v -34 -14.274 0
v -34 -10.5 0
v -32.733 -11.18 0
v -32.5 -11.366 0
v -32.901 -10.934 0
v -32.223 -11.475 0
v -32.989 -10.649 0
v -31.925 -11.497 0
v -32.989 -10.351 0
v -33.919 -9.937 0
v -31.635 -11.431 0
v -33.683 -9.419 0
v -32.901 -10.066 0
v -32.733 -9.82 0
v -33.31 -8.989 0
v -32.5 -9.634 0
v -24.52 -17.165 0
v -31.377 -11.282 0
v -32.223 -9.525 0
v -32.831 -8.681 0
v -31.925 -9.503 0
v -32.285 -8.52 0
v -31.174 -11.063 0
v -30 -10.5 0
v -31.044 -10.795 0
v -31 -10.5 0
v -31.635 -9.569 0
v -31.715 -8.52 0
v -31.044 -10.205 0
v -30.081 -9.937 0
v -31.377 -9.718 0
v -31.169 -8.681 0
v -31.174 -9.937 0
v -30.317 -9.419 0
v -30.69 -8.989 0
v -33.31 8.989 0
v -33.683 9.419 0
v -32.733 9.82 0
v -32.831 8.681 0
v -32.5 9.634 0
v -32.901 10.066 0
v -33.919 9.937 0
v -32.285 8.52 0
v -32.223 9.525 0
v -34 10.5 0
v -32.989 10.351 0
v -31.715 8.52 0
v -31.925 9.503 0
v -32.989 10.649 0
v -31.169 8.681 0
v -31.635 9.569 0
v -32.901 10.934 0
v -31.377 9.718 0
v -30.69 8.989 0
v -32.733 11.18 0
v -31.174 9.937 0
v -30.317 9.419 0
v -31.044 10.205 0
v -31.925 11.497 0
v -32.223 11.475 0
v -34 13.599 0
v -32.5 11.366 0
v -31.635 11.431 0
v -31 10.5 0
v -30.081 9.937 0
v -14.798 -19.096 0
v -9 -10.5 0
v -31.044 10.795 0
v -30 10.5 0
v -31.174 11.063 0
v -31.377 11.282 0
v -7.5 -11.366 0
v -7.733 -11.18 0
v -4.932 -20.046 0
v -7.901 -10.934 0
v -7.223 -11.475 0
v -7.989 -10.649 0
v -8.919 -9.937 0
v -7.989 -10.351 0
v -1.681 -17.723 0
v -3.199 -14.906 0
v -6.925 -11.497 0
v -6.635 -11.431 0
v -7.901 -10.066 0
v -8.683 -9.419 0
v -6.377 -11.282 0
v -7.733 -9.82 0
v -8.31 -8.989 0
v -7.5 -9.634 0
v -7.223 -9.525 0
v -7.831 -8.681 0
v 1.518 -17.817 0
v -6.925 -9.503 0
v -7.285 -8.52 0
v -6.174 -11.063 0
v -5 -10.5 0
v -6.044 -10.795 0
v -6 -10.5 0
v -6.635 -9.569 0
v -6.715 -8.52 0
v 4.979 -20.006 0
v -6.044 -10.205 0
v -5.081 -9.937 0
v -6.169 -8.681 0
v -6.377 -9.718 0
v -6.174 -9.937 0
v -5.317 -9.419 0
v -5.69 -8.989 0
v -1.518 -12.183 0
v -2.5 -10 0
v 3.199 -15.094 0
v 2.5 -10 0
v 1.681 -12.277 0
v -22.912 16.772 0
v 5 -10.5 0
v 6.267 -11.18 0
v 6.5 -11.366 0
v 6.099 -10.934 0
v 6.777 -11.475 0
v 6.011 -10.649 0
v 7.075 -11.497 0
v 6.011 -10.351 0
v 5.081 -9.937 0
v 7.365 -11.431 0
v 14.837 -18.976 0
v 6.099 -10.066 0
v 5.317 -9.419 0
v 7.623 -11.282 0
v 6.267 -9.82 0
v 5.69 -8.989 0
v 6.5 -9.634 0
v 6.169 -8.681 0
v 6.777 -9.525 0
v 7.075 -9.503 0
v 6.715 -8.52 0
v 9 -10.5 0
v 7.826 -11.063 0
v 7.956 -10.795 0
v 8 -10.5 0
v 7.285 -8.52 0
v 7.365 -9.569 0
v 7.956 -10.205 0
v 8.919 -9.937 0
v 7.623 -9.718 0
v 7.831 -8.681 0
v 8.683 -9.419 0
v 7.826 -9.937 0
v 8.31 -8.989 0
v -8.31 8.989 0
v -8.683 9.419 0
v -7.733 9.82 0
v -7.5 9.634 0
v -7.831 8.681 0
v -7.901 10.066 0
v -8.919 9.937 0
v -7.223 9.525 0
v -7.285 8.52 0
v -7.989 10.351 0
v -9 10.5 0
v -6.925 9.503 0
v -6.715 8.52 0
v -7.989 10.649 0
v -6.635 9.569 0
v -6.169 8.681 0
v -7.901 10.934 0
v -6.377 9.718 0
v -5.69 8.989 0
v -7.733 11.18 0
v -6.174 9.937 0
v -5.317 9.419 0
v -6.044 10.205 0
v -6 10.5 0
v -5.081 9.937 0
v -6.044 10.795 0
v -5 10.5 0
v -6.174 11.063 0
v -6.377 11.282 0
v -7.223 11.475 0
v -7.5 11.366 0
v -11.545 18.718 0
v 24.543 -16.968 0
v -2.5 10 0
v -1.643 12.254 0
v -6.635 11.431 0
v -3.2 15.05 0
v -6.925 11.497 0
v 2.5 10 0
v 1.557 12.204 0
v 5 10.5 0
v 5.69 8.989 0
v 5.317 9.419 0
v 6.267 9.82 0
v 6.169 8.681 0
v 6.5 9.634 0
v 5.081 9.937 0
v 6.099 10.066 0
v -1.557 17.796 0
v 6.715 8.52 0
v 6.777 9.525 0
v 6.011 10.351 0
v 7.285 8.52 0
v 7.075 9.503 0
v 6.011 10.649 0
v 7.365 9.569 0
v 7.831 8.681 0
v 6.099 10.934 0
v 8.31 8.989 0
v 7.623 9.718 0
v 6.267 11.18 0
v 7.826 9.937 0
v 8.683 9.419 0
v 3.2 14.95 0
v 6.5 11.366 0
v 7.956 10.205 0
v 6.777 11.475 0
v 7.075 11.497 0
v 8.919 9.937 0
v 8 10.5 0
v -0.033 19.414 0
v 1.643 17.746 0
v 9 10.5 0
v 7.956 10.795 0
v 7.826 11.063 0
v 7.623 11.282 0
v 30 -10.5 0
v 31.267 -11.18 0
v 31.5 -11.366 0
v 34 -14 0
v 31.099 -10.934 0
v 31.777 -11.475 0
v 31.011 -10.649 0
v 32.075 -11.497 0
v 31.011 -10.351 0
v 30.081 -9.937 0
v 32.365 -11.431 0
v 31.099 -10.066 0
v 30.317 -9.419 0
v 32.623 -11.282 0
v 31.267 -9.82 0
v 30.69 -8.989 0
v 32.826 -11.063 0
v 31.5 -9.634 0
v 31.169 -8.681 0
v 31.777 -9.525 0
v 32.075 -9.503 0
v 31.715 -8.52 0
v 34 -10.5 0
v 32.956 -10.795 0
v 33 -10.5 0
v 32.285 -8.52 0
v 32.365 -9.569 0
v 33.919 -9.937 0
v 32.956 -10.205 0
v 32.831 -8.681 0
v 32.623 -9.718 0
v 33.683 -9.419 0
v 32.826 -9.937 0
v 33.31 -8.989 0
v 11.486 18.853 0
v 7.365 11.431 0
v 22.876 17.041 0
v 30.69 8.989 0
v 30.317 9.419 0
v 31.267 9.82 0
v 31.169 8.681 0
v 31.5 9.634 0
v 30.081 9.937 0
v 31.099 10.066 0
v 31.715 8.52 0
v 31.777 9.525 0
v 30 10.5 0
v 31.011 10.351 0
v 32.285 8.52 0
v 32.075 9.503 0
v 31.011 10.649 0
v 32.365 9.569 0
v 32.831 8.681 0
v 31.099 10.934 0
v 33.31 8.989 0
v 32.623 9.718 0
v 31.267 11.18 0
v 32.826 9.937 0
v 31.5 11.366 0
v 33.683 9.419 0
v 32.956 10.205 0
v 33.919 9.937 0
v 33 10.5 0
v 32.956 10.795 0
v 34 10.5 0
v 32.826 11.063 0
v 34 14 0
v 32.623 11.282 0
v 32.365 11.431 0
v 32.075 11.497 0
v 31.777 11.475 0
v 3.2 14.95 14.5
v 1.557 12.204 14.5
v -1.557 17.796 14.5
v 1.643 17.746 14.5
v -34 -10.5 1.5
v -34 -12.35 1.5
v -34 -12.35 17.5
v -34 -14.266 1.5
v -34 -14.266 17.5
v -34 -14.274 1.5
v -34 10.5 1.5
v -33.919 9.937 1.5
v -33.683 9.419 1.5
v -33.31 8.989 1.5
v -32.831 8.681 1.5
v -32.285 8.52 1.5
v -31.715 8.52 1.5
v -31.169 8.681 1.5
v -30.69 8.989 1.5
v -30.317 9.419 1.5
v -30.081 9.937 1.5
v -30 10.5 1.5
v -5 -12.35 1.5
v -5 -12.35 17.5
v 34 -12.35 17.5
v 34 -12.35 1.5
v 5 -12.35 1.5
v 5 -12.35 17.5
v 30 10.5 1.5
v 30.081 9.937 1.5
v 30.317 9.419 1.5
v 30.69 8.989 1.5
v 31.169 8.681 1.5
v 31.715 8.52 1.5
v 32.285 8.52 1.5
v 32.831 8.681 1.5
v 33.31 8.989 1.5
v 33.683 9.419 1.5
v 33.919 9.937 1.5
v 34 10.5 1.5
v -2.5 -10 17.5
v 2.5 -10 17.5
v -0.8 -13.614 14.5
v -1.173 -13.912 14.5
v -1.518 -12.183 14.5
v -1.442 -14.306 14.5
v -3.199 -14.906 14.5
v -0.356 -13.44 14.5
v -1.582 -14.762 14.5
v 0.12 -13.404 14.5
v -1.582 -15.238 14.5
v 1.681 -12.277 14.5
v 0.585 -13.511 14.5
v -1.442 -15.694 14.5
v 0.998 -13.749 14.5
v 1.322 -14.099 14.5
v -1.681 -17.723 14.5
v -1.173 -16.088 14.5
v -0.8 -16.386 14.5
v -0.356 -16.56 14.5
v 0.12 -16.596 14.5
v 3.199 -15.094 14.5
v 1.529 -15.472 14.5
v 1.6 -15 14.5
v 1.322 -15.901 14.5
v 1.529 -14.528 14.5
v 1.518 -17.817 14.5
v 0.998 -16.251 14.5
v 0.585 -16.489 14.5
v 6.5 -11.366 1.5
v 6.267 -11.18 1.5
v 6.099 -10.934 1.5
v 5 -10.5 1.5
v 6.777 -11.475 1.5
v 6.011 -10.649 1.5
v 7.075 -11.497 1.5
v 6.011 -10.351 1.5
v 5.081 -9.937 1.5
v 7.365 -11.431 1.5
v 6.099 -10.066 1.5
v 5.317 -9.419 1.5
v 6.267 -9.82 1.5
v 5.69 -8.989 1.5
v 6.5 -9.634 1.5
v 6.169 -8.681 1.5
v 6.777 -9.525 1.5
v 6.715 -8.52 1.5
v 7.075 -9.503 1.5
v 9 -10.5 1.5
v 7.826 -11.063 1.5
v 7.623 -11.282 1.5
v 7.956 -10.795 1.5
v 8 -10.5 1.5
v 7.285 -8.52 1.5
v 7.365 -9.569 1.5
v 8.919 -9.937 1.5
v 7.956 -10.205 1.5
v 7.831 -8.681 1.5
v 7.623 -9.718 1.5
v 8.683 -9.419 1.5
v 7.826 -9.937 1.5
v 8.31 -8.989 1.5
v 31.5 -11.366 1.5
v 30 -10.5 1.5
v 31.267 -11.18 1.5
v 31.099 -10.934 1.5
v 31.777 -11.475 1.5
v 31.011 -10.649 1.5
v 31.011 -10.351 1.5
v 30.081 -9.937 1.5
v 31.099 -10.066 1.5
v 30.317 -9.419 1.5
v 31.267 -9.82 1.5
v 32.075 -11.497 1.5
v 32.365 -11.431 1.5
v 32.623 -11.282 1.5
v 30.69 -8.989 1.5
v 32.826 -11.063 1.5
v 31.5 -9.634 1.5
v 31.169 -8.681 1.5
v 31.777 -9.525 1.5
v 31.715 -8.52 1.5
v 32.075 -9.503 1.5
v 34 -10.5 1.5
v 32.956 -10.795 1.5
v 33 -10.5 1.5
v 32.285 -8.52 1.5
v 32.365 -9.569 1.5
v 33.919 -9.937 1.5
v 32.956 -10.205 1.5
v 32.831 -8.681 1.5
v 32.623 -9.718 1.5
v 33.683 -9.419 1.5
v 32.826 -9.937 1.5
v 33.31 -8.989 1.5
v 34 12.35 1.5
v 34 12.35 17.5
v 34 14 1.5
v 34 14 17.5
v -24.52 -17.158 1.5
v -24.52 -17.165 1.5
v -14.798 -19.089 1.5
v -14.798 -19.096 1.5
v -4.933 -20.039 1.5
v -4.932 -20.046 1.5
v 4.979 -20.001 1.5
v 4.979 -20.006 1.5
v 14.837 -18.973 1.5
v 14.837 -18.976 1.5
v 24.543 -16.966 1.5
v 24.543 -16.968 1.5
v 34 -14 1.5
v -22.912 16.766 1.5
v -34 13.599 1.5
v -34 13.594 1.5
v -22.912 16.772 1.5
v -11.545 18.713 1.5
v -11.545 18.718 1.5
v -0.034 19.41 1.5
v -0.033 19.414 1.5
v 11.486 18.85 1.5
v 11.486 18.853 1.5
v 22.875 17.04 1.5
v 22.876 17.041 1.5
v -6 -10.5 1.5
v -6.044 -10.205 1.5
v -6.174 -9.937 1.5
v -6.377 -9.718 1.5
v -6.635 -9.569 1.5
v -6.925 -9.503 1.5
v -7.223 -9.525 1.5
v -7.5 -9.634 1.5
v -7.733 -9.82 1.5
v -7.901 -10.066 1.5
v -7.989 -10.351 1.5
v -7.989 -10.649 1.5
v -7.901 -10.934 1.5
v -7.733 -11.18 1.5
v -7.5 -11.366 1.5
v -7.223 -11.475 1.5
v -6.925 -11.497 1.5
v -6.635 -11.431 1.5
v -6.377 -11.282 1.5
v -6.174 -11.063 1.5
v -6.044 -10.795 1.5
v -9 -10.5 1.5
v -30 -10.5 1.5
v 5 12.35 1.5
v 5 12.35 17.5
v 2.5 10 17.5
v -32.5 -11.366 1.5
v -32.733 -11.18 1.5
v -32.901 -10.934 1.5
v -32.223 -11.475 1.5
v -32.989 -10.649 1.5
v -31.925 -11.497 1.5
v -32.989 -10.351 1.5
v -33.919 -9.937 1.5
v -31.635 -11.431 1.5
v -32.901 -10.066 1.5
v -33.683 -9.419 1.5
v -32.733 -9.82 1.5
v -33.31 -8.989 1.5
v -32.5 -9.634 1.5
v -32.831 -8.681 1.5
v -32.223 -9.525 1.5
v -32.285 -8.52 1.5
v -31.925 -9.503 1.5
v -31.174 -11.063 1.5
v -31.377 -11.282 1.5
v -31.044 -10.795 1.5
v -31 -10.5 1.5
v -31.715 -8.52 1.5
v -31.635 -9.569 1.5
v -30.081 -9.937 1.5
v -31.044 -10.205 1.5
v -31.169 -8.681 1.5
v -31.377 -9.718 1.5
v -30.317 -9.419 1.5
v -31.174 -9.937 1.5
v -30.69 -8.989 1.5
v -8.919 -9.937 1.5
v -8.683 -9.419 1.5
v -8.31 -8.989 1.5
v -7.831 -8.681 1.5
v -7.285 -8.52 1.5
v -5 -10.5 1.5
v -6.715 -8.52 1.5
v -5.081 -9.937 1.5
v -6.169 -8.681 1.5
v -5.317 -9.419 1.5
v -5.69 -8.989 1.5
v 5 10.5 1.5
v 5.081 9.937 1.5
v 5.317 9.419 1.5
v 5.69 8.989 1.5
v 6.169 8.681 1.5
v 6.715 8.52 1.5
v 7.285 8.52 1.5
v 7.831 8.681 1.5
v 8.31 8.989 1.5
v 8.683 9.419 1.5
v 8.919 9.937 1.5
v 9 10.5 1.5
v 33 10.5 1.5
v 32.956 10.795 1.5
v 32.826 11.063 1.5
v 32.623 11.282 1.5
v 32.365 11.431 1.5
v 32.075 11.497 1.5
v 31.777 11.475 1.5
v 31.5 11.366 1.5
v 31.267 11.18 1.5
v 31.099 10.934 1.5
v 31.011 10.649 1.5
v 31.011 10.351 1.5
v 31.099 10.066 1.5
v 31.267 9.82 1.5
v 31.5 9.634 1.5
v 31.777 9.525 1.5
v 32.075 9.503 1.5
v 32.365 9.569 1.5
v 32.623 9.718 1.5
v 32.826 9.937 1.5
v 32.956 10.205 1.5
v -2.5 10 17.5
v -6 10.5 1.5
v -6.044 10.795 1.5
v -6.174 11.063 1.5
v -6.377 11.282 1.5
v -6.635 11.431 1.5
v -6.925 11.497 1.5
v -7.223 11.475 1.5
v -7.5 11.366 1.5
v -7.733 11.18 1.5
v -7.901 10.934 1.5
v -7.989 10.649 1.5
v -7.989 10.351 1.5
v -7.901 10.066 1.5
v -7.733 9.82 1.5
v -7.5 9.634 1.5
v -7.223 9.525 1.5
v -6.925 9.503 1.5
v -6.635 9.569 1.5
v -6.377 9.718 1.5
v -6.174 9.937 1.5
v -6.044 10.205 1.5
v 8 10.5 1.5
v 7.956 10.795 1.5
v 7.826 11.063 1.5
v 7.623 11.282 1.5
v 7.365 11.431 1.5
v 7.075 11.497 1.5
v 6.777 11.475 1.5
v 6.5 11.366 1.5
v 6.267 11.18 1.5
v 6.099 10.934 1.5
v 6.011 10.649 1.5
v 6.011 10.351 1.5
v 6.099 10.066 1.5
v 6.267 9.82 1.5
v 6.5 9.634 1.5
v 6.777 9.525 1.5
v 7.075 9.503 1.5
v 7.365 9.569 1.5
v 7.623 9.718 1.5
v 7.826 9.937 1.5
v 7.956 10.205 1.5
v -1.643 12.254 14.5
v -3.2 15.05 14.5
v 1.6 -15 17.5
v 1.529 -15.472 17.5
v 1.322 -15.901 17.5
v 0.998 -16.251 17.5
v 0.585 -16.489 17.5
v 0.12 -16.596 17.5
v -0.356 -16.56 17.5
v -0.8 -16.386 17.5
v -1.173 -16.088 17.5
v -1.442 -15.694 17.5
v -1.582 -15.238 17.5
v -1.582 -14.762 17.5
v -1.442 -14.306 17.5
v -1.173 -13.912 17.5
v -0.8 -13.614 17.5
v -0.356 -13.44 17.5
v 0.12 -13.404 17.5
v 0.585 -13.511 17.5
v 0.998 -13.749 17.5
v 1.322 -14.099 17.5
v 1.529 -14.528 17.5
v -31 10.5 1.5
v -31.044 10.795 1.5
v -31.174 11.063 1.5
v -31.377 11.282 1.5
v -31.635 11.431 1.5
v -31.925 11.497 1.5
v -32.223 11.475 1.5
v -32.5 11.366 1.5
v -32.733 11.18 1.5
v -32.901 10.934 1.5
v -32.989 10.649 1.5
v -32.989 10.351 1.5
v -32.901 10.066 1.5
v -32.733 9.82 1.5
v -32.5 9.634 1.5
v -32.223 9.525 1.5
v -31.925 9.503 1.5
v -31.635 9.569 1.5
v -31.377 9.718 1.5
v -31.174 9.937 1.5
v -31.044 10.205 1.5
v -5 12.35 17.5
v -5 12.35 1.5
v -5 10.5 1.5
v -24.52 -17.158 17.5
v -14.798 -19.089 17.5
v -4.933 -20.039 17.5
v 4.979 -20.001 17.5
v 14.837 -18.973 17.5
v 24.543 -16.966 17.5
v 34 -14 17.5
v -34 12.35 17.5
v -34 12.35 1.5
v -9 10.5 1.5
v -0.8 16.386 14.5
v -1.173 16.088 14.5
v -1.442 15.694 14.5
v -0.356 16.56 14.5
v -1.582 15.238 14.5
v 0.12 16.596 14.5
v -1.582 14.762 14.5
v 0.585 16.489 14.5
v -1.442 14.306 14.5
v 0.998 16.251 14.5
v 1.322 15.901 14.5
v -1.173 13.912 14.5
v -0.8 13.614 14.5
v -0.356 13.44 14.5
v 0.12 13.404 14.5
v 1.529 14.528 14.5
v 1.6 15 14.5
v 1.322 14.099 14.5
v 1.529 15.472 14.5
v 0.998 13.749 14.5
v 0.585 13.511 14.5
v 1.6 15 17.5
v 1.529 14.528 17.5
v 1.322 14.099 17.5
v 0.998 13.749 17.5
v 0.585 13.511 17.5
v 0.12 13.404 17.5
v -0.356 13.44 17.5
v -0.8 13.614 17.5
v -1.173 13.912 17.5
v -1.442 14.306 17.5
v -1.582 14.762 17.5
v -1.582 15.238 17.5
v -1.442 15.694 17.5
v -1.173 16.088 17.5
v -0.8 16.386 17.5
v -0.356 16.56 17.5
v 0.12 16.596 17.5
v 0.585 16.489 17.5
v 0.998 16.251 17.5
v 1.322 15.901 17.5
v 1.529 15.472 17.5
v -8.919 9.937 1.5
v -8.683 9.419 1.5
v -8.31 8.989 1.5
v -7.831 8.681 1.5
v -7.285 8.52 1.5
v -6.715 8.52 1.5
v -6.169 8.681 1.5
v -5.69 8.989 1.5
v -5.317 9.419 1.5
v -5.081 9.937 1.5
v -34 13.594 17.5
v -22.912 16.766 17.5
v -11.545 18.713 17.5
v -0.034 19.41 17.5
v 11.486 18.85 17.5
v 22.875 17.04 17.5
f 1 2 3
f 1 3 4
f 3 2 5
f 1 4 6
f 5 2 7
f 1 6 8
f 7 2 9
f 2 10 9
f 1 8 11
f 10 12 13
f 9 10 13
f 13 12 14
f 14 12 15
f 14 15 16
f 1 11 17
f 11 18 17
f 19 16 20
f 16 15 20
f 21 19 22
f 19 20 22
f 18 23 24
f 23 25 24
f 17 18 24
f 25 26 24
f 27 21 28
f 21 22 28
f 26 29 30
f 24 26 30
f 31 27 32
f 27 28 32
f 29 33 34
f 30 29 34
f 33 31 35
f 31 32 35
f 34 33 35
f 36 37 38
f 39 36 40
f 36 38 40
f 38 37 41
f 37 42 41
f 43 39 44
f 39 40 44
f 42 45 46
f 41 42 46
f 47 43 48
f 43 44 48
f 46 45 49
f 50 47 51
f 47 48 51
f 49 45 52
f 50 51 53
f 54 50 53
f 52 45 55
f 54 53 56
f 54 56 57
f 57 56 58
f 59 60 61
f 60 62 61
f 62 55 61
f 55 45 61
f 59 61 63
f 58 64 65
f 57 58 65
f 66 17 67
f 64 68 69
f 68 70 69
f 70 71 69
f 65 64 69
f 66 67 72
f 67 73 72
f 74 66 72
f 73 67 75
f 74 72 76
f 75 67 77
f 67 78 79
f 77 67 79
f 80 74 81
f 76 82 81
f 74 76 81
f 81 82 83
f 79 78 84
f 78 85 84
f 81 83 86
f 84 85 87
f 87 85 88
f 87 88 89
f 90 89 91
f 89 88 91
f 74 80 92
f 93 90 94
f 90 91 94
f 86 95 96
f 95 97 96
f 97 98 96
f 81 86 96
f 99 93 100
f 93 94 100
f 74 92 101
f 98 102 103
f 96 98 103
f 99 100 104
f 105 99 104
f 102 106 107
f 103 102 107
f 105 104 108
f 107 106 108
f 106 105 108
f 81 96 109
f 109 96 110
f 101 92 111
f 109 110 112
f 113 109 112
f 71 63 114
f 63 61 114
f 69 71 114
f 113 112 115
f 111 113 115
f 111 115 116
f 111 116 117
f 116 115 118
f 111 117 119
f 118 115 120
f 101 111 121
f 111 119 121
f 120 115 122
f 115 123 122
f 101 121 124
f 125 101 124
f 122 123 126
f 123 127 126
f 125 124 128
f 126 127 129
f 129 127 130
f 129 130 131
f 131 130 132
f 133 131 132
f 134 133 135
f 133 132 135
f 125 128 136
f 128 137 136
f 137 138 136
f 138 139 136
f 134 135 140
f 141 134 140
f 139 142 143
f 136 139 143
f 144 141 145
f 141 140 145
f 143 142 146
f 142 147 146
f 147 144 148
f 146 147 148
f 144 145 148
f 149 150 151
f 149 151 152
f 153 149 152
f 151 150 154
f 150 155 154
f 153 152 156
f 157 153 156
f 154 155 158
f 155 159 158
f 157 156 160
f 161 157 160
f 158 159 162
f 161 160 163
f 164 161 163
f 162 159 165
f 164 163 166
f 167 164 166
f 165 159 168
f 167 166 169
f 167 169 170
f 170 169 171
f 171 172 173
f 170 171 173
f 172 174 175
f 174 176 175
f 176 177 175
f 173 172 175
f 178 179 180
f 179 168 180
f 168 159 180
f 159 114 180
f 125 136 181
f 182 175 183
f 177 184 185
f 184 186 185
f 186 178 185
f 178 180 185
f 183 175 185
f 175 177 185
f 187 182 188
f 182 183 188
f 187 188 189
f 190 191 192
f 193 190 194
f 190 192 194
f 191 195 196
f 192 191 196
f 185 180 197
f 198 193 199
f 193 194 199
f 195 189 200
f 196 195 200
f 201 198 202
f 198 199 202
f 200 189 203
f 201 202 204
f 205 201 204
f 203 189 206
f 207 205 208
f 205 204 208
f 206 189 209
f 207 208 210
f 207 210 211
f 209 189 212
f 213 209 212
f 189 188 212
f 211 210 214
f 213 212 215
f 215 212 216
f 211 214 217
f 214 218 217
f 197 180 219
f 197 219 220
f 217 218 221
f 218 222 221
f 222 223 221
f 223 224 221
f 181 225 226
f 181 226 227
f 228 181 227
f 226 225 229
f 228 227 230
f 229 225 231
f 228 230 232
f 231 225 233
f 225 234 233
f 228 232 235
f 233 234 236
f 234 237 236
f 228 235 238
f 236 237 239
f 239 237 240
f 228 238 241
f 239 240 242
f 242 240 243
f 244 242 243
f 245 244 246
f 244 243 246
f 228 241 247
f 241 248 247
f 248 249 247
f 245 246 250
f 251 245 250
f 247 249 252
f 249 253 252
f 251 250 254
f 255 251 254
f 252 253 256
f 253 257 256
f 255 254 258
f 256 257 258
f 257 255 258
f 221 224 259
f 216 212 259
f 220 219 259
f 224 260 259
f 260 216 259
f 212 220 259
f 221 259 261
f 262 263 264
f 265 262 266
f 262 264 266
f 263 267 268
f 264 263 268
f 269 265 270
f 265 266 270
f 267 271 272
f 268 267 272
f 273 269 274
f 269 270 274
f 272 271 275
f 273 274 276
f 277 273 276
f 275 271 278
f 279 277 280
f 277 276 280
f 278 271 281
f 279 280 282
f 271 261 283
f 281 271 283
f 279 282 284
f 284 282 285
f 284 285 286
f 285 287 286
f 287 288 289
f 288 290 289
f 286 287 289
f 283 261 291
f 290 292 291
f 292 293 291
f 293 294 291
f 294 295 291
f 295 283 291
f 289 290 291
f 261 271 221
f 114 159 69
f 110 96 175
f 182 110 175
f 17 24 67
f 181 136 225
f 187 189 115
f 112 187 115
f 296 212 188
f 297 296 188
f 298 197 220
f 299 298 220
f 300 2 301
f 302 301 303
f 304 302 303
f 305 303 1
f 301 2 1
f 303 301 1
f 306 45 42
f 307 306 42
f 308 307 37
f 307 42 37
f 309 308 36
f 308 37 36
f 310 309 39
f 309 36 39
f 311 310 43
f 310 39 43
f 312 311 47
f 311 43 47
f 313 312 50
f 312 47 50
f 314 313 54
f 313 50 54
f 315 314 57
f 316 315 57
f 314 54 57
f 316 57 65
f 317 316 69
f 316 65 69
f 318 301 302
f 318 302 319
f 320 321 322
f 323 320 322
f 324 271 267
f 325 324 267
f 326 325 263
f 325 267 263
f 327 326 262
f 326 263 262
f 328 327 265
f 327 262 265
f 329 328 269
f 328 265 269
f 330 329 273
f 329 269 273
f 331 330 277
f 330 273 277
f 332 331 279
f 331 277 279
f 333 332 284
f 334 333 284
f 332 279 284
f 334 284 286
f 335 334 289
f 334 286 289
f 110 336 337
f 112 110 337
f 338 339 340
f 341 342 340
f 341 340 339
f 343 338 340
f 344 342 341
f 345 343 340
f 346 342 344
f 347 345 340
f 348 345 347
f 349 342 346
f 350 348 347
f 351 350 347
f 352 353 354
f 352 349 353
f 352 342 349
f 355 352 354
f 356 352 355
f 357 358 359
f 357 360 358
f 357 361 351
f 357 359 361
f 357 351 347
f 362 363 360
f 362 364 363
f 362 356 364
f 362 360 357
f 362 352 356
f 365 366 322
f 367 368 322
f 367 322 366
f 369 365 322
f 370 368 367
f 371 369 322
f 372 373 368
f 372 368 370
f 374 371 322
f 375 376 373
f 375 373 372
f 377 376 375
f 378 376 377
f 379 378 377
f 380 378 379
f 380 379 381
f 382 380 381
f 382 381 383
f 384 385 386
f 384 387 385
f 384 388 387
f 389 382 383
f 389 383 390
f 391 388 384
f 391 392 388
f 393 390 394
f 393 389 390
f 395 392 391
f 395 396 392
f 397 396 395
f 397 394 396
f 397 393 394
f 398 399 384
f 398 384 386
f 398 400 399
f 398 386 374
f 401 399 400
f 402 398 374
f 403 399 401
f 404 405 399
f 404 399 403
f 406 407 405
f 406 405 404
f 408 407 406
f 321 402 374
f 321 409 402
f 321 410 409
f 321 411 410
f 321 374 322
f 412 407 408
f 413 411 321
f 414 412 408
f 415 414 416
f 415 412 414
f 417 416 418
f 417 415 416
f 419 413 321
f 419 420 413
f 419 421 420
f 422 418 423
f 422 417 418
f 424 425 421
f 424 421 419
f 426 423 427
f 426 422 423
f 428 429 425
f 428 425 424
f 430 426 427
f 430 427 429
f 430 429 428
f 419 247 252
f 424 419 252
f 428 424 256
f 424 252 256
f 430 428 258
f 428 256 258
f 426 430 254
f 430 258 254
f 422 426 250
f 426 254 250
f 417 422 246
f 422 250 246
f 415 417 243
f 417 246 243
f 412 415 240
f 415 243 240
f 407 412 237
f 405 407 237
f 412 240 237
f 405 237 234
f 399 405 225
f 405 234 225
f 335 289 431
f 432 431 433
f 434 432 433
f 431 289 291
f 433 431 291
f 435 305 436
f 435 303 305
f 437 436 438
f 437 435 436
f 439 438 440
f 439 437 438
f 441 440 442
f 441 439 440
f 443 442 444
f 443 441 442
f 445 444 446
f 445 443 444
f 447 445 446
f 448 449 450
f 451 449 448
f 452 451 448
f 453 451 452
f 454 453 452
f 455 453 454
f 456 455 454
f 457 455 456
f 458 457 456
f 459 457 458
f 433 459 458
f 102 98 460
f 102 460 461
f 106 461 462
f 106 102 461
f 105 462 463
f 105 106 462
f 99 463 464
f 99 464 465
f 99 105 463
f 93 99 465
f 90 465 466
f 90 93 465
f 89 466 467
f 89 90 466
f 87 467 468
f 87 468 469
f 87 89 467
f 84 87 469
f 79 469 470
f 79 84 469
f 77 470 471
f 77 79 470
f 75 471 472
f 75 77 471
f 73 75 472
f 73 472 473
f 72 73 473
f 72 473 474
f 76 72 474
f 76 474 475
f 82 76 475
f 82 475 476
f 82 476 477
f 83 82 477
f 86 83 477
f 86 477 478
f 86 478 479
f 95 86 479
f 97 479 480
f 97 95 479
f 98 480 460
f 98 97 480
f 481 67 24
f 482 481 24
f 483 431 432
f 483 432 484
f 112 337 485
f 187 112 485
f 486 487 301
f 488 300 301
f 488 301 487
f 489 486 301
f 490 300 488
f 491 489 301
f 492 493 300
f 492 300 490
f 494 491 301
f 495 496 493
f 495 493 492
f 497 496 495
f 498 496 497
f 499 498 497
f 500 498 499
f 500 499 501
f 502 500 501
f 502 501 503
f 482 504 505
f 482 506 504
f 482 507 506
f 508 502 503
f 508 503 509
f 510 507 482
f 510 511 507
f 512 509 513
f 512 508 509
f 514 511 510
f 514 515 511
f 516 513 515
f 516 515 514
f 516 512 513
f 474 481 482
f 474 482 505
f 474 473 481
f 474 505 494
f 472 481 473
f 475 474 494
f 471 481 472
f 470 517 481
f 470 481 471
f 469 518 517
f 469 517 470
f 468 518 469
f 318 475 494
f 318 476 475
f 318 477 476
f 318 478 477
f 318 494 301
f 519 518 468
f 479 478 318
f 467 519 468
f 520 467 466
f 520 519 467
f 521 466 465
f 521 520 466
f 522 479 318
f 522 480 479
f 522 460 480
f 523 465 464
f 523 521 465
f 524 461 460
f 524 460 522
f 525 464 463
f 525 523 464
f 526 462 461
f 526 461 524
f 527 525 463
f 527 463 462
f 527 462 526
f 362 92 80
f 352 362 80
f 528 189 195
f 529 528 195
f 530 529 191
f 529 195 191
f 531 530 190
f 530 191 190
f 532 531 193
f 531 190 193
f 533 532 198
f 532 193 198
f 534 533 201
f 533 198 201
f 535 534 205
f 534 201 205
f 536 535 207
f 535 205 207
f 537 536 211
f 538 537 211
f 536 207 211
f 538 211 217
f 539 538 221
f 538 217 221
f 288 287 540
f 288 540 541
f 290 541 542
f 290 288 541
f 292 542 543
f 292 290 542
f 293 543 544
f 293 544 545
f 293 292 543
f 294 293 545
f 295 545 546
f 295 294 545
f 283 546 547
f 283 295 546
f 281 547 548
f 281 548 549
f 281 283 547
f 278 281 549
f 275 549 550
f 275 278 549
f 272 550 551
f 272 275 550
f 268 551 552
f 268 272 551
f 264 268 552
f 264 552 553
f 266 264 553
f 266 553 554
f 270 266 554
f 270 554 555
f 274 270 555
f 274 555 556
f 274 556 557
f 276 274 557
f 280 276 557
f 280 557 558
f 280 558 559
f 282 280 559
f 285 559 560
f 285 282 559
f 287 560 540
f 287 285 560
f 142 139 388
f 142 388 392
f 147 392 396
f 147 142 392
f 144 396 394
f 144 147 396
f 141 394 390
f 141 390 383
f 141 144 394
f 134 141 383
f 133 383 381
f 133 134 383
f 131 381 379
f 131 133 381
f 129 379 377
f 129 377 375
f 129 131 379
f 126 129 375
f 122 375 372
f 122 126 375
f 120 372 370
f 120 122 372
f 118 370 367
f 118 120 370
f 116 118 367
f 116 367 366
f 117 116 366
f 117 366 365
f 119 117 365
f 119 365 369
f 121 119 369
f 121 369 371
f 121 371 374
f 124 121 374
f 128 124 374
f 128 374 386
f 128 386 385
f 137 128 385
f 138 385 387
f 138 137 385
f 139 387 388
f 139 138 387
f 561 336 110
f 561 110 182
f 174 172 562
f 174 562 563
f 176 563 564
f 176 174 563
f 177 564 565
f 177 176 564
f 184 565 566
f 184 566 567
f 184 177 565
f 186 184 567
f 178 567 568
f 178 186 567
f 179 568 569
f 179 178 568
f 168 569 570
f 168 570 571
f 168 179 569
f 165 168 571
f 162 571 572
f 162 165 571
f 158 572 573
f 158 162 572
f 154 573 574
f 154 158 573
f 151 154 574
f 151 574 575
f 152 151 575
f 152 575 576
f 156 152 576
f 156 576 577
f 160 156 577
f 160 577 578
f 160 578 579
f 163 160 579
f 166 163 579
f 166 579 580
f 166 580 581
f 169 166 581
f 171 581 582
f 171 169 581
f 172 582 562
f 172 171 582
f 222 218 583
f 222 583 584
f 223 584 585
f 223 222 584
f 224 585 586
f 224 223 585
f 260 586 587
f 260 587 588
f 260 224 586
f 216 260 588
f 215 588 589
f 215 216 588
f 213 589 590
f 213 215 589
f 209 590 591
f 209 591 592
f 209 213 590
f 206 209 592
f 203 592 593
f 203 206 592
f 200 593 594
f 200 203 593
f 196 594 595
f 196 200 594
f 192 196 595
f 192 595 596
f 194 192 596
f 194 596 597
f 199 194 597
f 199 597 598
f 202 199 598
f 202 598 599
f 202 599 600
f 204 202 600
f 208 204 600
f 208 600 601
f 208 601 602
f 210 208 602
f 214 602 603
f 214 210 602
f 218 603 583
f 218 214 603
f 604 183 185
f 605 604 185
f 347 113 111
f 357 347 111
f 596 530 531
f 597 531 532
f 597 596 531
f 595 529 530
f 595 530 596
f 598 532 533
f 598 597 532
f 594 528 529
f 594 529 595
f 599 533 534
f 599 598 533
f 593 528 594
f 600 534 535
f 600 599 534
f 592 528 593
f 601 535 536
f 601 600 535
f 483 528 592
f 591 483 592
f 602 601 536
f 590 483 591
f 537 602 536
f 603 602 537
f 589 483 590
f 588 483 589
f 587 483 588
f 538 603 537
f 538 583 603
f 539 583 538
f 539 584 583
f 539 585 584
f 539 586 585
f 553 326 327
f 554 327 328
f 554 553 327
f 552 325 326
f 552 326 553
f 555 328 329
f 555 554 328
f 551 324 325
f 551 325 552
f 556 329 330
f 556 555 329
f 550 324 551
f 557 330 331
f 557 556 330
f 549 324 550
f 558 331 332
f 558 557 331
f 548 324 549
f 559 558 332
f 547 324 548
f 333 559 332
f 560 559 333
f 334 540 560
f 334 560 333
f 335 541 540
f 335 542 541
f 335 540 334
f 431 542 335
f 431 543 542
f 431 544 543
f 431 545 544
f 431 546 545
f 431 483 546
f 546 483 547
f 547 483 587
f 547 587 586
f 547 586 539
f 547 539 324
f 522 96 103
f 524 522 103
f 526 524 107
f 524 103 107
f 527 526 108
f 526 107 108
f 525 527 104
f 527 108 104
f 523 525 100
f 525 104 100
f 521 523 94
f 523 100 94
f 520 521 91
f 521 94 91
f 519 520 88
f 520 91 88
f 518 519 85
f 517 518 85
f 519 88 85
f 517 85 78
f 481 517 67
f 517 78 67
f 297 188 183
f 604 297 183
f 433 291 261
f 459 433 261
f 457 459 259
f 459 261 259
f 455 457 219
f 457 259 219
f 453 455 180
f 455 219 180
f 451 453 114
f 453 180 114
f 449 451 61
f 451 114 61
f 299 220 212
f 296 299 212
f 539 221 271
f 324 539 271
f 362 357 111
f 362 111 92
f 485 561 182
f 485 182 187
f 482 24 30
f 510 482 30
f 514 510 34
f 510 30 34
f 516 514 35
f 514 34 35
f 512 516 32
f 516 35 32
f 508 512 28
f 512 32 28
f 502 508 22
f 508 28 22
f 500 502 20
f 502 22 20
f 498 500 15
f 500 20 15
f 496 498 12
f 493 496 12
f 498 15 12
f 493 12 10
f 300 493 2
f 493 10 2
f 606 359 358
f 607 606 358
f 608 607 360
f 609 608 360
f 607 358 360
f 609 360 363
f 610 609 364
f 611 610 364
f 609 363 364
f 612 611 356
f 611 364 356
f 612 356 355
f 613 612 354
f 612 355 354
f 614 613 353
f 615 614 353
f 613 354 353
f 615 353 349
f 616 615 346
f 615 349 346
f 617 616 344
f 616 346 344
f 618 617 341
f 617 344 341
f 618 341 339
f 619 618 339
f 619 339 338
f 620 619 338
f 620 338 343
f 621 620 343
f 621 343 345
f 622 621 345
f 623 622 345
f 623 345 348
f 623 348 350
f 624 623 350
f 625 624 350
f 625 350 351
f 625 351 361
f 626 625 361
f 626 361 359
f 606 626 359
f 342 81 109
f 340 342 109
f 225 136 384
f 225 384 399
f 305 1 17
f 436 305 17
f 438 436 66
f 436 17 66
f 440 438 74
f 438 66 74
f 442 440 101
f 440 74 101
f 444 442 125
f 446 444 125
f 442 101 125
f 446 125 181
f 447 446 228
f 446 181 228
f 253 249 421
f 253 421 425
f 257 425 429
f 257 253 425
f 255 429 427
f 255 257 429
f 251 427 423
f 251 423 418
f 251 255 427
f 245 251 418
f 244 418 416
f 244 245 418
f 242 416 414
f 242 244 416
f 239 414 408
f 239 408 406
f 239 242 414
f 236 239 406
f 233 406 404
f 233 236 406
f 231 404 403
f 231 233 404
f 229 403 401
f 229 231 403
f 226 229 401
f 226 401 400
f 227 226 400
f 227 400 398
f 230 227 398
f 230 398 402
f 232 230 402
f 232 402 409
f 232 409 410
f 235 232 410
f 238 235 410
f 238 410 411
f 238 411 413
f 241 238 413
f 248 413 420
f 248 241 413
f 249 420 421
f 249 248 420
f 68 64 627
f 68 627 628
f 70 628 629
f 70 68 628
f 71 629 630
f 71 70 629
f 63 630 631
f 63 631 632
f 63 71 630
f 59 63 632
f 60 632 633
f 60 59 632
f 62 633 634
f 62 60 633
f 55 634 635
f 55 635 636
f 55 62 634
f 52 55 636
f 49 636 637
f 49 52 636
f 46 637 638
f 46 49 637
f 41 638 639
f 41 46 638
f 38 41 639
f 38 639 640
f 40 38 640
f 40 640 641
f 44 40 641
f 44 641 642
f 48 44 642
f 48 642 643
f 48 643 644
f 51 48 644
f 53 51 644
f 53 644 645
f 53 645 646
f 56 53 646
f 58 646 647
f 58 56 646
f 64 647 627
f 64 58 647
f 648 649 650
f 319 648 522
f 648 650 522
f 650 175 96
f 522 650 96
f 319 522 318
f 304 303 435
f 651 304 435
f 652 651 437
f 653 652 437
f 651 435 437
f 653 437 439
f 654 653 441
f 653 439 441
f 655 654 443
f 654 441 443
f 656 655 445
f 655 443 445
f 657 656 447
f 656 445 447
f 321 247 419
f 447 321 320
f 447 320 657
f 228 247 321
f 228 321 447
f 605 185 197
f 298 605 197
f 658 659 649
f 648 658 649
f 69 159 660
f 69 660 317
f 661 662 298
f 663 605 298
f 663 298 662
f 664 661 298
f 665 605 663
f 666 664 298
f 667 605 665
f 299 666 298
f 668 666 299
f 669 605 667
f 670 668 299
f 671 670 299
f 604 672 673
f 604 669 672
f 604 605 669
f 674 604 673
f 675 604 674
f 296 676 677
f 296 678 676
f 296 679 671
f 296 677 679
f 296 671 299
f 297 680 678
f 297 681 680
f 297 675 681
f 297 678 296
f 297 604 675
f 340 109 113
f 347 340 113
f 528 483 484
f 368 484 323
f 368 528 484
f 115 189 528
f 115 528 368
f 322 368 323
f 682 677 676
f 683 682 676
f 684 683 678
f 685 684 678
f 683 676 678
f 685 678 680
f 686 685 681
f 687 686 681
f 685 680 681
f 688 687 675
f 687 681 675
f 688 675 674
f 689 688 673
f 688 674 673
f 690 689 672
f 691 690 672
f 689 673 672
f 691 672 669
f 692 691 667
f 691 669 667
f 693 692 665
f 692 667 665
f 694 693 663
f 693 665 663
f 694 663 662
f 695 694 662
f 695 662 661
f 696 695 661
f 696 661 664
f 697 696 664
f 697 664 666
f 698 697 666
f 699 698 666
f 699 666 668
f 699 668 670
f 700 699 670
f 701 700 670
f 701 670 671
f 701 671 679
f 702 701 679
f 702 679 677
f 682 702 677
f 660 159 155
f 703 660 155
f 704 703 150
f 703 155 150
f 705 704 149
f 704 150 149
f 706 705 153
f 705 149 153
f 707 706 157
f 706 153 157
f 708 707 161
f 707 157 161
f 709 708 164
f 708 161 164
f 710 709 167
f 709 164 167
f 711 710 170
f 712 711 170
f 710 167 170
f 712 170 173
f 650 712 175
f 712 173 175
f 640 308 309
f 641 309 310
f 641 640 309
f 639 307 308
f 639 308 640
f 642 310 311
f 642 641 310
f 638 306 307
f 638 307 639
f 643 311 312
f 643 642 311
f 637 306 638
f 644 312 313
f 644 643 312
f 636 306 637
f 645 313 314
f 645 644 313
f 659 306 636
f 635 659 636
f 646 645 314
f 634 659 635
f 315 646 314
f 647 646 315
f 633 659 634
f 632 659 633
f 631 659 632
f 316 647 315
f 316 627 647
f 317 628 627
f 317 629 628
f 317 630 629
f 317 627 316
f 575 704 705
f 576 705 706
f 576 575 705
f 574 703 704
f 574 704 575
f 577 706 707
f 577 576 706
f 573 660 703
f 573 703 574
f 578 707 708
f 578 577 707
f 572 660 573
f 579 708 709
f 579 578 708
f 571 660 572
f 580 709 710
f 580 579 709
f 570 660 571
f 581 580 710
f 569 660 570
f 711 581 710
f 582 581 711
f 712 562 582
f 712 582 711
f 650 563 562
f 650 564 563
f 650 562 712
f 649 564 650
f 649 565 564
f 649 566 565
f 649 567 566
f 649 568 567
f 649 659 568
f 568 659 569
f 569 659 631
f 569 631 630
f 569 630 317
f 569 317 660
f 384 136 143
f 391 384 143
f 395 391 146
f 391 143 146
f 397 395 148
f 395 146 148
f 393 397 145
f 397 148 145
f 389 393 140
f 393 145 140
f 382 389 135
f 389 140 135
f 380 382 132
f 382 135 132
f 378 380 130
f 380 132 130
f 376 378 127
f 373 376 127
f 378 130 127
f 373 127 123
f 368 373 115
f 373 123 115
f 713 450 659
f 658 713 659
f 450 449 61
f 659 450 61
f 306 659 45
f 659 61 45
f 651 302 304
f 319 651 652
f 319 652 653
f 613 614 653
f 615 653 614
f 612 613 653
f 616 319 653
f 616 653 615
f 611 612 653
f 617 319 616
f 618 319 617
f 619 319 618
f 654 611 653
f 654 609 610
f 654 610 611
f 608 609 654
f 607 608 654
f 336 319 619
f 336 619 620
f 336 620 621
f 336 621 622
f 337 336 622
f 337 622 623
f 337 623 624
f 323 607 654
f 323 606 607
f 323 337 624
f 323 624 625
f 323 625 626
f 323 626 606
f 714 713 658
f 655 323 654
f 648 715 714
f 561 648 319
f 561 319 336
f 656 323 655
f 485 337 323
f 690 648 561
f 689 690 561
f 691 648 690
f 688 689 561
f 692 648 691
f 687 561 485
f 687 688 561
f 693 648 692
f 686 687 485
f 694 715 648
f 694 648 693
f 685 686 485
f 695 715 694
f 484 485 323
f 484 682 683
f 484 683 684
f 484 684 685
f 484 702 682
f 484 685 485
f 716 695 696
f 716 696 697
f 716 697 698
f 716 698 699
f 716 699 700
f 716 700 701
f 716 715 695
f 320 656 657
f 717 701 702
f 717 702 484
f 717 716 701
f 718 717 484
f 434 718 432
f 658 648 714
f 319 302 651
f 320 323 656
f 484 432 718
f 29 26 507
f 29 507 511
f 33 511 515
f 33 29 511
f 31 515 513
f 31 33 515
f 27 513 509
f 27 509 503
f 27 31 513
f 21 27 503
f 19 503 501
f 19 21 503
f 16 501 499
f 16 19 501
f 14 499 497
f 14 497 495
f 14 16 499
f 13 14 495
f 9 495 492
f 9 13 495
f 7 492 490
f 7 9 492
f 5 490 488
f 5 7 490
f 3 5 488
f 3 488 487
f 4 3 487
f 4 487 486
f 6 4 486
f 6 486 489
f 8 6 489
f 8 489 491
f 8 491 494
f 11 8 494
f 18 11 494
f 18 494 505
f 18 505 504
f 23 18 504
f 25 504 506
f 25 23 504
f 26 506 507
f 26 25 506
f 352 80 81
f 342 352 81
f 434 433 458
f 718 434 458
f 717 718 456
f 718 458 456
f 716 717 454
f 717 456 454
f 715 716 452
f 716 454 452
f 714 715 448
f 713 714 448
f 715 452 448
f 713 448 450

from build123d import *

# Parameters (mm, degrees)
SKETCH_R        = 1
PAD_DEPTH       = 1.5
PAD001_DEPTH    = 16
SKETCH002_R     = 1.6
POCKET_DEPTH    = 40
POCKET001_DEPTH = 14.5
SKETCH006_W     = 5
SKETCH006_H     = 20
POCKET002_DEPTH = 20


with BuildPart() as part:
    # Sketch → Pad (new body)
    with BuildSketch(Plane.XY):
        with BuildLine():
            Line((9, 10.5), (30, 10.5))
            ThreePointArc((30, 10.5), (32, 8.5), (34, 10.5))
            Line((34, 10.5), (34, 14))
            ThreePointArc((34, 14), (-0.033107, 19.414422), (-34, 13.599057))
            Line((-34, 10.5), (-34, 13.599057))
            ThreePointArc((-34, 10.5), (-32, 8.5), (-30, 10.5))
            Line((-9, 10.5), (-30, 10.5))
            ThreePointArc((-9, 10.5), (-7, 8.5), (-5, 10.5))
            Line((-5, 10.5), (-5, -10.5))
            ThreePointArc((-5, -10.5), (-7, -8.5), (-9, -10.5))
            Line((-9, -10.5), (-30, -10.5))
            ThreePointArc((-30, -10.5), (-32, -8.5), (-34, -10.5))
            Line((-34, -10.5), (-34, -14.274102))
            ThreePointArc((-34, -14.274102), (0.024236, -20.149507), (34, -14))
            Line((34, -10.5), (34, -14))
            ThreePointArc((34, -10.5), (32, -8.5), (30, -10.5))
            Line((9, -10.5), (30, -10.5))
            ThreePointArc((9, -10.5), (7, -8.5), (5, -10.5))
            Line((5, 10.5), (5, -10.5))
            ThreePointArc((5, 10.5), (7, 8.5), (9, 10.5))
        make_face()
        with Locations((7, 10.5)):
            Circle(SKETCH_R, mode=Mode.SUBTRACT)
        with Locations((7, -10.5)):
            Circle(SKETCH_R, mode=Mode.SUBTRACT)
        with Locations((32, 10.5)):
            Circle(SKETCH_R, mode=Mode.SUBTRACT)
        with Locations((32, -10.5)):
            Circle(SKETCH_R, mode=Mode.SUBTRACT)
        with Locations((-7, 10.5)):
            Circle(SKETCH_R, mode=Mode.SUBTRACT)
        with Locations((-7, -10.5)):
            Circle(SKETCH_R, mode=Mode.SUBTRACT)
        with Locations((-32, 10.5)):
            Circle(SKETCH_R, mode=Mode.SUBTRACT)
        with Locations((-32, -10.5)):
            Circle(SKETCH_R, mode=Mode.SUBTRACT)
    extrude(amount=PAD_DEPTH)

    # Sketch001 → Pad001 (new body)
    with BuildSketch(Plane.XY.offset(1.5)):
        with BuildLine():
            Line((-34, 12.35), (-5, 12.35))
            Line((-5, 12.35), (-5, 10.5))
            Line((-5, 10.5), (-5, -10.5))
            Line((-5, -10.5), (-5, -12.35))
            Line((-34, -12.35), (-5, -12.35))
            Line((-34, -12.35), (-34, -14.265938))
            ThreePointArc((-34, -14.265938), (0.023508, -20.143886), (34, -14))
            Line((34, -12.35), (34, -14))
            Line((34, -12.35), (5, -12.35))
            Line((5, -10.5), (5, -12.35))
            Line((5, 10.5), (5, -10.5))
            Line((5, 12.35), (5, 10.5))
            Line((34, 12.35), (5, 12.35))
            Line((34, 12.35), (34, 14))
            ThreePointArc((34, 14), (-0.033512, 19.410124), (-34, 13.594018))
            Line((-34, 13.594018), (-34, 12.35))
        make_face()
    extrude(amount=PAD001_DEPTH)

    # Sketch002 → Pocket (cut)
    with BuildSketch(Plane(origin=(0, 0, 0), x_dir=(1, 0, 0), z_dir=(0, 0, -1))):
        with Locations((0, 15)):
            Circle(SKETCH002_R)
        with Locations((0, -15)):
            Circle(SKETCH002_R)
    extrude(amount=-POCKET_DEPTH, mode=Mode.SUBTRACT)

    # Sketch005 → Pocket001 (cut)
    with BuildSketch(Plane(origin=(0, 0, 0), x_dir=(1, 0, 0), z_dir=(0, 0, -1))):
        Polygon((1.680935, 12.27705), (3.198611, 15.094258), (1.517676, 17.817208), (-1.680935, 17.72295), (-3.198611, 14.905742), (-1.517676, 12.182792), align=None)
        Polygon((1.642986, -17.746015), (3.199612, -14.95014), (1.556626, -12.204125), (-1.642986, -12.253985), (-3.199612, -15.04986), (-1.556626, -17.795875), align=None)
    extrude(amount=-POCKET001_DEPTH, mode=Mode.SUBTRACT)

    # Sketch006 → Pocket002 (cut)
    with BuildSketch(Plane.XY.offset(17.5)):
        Rectangle(SKETCH006_W, SKETCH006_H)
    extrude(amount=-POCKET002_DEPTH, mode=Mode.SUBTRACT)


solid = part.part
